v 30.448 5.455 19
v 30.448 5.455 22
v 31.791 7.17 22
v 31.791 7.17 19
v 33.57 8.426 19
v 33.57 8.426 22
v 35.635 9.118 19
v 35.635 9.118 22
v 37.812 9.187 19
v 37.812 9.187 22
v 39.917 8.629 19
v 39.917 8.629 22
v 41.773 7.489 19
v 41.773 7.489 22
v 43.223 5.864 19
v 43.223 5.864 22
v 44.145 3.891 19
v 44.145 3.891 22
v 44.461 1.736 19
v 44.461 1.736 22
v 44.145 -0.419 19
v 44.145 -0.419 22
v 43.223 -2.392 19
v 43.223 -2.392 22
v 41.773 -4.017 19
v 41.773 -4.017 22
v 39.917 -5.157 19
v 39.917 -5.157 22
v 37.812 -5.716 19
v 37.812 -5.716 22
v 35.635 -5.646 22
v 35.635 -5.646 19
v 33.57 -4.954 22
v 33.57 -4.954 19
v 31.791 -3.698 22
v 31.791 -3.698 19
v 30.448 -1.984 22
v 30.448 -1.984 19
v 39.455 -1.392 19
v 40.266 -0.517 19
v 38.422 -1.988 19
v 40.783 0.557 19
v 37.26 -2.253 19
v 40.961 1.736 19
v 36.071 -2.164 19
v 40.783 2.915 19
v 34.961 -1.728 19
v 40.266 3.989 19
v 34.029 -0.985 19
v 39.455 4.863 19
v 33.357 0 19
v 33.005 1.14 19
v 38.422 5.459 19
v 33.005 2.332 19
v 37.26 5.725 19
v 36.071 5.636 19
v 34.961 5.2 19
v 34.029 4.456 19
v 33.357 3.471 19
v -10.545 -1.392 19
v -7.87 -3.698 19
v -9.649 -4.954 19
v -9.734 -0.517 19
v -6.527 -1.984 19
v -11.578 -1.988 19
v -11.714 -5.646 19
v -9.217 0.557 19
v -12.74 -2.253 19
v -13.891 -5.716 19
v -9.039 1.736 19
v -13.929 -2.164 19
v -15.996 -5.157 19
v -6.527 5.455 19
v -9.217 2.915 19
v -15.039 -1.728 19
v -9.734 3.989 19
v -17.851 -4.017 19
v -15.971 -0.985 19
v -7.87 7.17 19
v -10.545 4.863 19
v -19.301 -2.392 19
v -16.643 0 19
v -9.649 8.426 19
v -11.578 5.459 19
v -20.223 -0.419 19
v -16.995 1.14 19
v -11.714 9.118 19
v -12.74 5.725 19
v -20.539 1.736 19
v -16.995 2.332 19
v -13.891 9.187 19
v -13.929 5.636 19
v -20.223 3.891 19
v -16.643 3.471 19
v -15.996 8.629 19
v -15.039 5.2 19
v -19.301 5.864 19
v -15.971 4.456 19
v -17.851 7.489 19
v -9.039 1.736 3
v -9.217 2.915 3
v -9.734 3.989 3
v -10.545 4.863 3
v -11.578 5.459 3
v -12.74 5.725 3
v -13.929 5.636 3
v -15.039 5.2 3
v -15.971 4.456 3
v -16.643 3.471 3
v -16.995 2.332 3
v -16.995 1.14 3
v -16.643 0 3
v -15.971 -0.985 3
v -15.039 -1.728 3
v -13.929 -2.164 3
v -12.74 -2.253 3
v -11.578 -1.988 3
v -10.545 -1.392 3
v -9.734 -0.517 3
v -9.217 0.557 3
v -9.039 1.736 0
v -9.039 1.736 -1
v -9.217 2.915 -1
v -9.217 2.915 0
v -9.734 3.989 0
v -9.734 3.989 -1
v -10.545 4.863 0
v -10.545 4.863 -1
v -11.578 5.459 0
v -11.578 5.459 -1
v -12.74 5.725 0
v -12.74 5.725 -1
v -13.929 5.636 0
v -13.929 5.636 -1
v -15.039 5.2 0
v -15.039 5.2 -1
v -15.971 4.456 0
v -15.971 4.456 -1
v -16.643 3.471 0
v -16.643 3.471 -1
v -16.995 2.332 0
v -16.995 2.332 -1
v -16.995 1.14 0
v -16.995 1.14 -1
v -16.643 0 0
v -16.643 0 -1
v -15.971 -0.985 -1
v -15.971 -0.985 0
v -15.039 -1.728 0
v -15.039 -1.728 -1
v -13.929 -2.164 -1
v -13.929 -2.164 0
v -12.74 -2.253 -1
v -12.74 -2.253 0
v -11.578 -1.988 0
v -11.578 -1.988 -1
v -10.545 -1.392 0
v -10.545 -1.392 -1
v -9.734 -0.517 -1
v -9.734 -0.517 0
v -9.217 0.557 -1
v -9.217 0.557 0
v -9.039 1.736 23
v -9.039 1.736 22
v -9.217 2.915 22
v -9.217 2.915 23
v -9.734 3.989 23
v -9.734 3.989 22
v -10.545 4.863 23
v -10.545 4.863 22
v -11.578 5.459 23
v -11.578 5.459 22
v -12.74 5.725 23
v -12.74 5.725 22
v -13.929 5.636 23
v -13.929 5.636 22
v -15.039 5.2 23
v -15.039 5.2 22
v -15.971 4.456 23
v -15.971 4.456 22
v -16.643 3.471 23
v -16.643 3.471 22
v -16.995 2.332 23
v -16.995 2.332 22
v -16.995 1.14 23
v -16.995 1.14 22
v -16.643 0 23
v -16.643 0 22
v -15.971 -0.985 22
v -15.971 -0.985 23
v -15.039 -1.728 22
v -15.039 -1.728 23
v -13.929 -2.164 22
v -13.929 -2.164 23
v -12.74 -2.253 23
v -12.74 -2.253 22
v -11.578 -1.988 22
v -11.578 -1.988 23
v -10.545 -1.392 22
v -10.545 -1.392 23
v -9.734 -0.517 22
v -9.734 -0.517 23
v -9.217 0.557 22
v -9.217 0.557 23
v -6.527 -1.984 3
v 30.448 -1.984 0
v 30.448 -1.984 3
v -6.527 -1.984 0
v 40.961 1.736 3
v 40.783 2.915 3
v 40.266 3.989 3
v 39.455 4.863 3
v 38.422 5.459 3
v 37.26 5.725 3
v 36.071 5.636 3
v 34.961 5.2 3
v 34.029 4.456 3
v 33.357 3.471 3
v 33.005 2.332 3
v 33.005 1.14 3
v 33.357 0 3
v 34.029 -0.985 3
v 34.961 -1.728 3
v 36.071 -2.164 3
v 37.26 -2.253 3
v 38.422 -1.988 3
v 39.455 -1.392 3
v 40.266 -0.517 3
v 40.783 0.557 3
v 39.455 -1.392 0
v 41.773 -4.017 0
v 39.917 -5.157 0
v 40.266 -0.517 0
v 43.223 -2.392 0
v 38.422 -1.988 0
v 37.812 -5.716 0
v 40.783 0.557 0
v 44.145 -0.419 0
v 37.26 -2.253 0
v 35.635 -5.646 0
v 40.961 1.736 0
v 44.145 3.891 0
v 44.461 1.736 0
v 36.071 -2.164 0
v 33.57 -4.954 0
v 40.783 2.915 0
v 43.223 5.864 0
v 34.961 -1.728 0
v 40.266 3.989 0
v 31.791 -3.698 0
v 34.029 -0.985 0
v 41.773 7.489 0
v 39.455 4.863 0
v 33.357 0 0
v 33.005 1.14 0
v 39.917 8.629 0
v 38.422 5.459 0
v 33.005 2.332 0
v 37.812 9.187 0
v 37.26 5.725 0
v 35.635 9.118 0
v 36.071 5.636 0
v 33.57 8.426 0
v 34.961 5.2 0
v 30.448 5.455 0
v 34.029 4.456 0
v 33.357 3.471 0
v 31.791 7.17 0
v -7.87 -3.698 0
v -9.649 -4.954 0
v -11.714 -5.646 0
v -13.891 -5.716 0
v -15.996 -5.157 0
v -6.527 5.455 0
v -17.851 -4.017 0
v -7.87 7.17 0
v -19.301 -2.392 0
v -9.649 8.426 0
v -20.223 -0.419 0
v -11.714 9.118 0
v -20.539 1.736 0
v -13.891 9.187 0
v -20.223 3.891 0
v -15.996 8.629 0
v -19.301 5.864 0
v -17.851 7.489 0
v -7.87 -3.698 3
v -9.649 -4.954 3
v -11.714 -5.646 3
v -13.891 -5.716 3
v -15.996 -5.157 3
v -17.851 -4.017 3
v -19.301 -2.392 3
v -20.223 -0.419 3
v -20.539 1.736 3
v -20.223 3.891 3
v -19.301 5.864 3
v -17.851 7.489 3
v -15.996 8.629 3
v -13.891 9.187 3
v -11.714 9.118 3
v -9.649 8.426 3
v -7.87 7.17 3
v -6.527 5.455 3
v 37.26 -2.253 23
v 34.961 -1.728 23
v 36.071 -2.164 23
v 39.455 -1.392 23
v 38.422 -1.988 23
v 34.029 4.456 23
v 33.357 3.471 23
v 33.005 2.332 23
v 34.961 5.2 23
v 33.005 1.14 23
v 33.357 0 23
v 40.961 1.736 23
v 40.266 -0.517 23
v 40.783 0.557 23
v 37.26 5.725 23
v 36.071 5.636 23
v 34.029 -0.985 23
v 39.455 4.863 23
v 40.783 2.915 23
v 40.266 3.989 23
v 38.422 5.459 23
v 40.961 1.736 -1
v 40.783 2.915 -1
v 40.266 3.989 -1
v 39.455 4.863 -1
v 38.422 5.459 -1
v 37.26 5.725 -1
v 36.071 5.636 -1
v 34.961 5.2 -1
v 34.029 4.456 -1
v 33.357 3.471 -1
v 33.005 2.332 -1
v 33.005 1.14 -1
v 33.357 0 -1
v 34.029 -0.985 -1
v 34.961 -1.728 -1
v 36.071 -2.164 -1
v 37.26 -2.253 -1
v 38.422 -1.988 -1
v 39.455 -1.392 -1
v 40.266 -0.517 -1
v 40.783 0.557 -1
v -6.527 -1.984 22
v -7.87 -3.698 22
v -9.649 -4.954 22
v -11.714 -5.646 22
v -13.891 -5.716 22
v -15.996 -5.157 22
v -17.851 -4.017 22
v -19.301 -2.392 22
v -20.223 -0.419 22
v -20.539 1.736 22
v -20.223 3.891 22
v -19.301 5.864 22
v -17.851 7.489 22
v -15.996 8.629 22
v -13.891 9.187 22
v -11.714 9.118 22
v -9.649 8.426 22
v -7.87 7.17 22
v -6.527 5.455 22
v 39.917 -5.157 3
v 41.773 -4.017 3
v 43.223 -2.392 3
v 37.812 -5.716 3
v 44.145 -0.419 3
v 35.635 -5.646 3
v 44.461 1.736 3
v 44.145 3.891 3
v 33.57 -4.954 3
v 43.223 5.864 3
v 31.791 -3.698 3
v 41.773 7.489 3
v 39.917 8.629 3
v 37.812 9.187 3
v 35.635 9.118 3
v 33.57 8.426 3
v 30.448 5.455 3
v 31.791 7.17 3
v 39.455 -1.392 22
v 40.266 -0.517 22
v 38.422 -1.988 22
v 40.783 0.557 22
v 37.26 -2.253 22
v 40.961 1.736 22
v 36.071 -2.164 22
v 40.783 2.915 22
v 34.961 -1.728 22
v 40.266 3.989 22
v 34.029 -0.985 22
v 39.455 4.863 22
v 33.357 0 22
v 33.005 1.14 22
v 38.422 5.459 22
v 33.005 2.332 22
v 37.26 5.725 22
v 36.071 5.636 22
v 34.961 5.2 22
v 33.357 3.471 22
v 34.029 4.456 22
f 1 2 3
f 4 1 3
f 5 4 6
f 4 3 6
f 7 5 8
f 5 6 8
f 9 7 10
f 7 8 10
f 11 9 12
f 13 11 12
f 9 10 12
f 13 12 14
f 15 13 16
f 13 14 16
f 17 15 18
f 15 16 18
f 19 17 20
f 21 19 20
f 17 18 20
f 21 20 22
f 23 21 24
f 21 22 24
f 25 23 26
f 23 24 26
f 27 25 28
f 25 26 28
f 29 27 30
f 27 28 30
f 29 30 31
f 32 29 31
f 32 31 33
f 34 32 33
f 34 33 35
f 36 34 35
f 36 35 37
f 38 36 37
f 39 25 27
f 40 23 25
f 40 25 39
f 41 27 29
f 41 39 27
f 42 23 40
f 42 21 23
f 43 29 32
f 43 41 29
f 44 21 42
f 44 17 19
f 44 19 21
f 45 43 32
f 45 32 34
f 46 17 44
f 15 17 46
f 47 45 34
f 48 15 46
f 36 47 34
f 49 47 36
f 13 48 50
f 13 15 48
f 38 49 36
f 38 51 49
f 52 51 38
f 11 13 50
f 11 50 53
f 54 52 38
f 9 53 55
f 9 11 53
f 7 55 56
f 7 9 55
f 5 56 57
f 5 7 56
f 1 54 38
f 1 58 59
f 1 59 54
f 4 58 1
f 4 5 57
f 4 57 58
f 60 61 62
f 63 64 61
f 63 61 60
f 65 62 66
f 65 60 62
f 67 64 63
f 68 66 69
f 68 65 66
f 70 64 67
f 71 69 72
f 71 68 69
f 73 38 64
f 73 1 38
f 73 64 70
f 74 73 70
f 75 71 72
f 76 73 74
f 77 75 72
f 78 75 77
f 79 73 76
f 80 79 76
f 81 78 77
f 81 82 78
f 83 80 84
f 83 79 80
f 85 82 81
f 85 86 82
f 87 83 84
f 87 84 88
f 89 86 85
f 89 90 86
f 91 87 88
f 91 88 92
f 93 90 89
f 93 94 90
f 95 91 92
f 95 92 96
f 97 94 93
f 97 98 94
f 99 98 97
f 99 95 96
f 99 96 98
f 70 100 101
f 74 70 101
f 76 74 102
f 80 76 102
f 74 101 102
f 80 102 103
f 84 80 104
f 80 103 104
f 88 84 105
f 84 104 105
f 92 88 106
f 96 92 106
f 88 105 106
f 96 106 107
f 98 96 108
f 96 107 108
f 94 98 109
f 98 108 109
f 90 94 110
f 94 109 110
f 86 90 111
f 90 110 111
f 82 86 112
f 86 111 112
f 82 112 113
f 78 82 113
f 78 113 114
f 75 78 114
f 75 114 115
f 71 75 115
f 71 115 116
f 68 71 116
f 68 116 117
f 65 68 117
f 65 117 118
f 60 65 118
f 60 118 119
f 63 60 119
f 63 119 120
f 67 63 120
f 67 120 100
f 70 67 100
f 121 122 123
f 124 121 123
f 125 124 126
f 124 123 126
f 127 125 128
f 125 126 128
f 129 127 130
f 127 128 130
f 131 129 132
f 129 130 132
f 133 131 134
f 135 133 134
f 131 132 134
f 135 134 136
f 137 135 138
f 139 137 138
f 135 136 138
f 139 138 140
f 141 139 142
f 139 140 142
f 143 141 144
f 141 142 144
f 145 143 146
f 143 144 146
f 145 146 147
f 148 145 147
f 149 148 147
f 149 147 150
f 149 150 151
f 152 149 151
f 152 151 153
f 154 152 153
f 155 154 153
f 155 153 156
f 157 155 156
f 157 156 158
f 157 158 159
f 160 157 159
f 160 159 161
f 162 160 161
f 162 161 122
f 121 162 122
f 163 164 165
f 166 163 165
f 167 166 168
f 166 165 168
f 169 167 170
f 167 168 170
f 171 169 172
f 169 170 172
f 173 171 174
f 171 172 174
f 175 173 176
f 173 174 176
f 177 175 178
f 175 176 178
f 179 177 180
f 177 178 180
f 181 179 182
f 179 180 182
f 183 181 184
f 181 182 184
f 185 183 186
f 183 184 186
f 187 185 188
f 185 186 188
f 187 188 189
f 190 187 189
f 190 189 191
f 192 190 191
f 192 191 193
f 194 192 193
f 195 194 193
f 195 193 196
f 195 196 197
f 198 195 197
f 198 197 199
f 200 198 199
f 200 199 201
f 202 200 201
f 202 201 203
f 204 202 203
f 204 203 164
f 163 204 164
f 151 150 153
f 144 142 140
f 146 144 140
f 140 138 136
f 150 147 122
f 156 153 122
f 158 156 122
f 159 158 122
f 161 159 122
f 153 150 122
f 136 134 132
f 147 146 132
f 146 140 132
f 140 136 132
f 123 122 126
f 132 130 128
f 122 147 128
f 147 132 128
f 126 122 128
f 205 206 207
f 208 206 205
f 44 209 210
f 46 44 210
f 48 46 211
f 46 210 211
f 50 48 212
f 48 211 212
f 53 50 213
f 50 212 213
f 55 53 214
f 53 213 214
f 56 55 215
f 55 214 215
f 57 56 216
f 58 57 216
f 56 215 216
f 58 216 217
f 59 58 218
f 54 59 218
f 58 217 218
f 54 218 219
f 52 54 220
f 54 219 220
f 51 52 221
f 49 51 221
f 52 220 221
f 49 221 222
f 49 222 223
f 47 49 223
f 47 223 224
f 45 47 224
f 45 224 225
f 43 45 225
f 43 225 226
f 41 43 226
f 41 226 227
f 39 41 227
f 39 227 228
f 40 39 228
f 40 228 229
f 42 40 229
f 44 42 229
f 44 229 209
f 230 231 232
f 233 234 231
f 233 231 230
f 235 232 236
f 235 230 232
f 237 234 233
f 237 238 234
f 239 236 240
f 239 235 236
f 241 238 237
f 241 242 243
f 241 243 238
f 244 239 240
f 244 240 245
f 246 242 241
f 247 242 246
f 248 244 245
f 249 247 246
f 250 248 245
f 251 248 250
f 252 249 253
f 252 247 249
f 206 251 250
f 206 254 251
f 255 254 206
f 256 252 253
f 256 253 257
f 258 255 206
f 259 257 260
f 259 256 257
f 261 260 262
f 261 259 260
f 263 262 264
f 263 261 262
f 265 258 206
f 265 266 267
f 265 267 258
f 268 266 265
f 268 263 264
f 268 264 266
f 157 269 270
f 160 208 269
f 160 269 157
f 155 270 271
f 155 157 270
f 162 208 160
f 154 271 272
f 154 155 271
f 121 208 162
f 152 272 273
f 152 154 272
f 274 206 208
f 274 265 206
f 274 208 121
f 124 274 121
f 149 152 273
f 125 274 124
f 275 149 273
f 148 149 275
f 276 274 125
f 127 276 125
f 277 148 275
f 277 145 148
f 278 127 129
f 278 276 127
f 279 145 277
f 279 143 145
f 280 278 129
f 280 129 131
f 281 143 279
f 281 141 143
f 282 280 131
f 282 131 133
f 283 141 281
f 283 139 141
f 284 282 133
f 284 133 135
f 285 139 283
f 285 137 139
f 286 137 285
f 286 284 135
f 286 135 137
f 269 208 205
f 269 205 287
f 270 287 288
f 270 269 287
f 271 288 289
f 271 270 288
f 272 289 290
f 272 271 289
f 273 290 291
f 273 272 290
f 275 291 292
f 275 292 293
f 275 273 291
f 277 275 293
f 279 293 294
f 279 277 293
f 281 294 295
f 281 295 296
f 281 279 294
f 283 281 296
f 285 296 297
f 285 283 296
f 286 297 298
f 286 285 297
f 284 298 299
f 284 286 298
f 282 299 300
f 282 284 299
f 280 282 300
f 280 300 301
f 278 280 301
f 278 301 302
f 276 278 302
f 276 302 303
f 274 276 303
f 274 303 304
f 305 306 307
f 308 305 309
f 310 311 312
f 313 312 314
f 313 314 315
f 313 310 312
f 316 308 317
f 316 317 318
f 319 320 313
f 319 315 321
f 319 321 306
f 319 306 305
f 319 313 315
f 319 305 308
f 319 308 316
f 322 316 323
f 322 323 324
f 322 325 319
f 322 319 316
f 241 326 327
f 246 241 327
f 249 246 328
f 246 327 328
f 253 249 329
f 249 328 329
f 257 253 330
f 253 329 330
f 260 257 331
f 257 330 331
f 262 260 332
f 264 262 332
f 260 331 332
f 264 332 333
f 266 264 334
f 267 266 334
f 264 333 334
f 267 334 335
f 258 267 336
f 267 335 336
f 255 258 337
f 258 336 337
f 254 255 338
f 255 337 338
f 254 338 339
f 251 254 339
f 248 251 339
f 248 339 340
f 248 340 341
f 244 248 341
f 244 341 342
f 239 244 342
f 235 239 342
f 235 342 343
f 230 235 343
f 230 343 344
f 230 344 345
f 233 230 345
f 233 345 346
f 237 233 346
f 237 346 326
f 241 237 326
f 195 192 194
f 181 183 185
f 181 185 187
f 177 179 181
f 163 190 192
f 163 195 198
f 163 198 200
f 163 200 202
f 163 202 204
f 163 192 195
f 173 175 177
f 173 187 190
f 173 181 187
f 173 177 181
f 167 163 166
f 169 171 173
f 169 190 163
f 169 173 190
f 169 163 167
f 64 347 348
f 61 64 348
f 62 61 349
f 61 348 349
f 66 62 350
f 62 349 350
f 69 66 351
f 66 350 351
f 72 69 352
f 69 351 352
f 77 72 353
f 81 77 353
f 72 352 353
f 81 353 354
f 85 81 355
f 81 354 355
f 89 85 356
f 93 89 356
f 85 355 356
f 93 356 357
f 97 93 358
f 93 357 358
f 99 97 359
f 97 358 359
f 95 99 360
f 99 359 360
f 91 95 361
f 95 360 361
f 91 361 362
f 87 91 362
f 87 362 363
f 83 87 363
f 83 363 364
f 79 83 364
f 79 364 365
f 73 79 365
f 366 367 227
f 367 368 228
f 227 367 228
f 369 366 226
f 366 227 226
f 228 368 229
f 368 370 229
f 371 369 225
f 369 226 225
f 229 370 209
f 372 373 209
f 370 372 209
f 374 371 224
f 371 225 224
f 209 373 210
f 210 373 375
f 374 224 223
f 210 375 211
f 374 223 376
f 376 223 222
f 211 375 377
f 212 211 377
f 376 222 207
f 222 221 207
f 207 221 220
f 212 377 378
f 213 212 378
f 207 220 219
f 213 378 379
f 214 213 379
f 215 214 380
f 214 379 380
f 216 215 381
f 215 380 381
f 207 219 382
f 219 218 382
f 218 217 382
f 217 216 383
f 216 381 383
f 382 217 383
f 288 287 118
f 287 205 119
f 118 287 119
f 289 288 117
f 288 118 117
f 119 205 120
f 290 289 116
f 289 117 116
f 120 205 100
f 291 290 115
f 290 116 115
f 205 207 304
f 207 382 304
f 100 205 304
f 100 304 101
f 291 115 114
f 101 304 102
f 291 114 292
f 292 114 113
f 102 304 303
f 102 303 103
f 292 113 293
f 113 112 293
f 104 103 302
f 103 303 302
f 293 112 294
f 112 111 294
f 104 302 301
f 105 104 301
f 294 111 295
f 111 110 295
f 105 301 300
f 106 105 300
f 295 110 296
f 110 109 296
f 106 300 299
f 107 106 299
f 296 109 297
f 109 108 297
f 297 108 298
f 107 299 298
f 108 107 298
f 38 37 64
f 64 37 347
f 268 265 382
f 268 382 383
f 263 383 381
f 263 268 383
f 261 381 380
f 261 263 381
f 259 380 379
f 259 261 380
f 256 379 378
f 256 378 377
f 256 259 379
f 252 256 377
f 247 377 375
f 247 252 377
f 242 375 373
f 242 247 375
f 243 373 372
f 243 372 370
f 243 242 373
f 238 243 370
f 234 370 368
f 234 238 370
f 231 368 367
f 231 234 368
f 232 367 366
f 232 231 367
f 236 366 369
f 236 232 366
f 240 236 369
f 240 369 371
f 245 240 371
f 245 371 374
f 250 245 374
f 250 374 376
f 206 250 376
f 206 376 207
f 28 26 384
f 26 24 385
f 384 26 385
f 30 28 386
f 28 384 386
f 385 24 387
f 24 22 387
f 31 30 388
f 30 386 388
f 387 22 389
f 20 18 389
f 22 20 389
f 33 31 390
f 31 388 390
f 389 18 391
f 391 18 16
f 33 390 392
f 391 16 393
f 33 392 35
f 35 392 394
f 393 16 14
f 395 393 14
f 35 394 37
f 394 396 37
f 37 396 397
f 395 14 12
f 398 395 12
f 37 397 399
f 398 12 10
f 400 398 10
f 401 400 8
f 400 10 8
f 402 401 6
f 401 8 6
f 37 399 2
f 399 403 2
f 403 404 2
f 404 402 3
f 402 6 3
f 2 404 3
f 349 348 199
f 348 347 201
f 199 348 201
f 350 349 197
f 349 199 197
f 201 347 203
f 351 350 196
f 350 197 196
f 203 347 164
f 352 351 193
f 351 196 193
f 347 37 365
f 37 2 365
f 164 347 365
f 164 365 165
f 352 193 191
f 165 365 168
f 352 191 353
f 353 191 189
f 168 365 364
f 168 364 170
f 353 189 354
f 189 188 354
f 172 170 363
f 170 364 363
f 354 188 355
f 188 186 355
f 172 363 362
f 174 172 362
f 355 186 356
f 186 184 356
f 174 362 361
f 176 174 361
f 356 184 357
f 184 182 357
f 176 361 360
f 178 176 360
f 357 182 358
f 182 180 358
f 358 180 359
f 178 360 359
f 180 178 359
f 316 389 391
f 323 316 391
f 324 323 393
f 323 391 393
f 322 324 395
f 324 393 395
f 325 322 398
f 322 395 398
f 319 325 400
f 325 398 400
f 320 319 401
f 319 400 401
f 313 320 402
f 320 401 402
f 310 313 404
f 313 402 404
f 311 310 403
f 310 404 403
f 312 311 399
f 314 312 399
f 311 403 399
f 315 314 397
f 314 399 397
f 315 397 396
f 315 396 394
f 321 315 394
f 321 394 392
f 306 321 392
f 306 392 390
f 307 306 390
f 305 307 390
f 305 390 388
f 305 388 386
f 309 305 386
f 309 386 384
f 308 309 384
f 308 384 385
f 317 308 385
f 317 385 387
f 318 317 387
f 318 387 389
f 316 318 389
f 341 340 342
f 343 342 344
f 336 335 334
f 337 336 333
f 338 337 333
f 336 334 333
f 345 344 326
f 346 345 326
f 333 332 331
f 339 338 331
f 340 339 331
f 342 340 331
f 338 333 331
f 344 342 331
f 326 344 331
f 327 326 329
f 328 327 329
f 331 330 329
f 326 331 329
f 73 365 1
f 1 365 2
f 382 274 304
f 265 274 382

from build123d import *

# Parameters (mm, degrees)
SKETCH_1_R           = 4
EXTRUDE_1_DEPTH      = 3
EXTRUDE_2_DEPTH      = 20
EXTRUDE_2_DEPTH_BACK = 4
SKETCH_2_R           = 4


with BuildPart() as part:
    # 草图1 → 凸台-拉伸1 (new body)
    with BuildSketch(Plane.XY):
        with BuildLine():
            Line((-6.52657961, 5.455372618), (30.448093928, 5.455372618))
            ThreePointArc((30.448093928, 5.455372618), (44.460757159, 1.735800378), (30.448093928, -1.983771861))
            Line((30.448093928, -1.983771861), (-6.52657961, -1.983771861))
            ThreePointArc((-6.52657961, -1.983771861), (-20.539242841, 1.735800378), (-6.52657961, 5.455372618))
        make_face()
        with Locations((-13.039242841, 1.735800378)):
            Circle(SKETCH_1_R, mode=Mode.SUBTRACT)
        with Locations(Location((36.960757159, 1.735800378, 0), (0, 0, 180))):
            Circle(SKETCH_1_R, mode=Mode.SUBTRACT)
    extrude_1 = extrude(amount=EXTRUDE_1_DEPTH)

    # 草图2 → 凸台-拉伸2 (add, two sides: drawn at the far end of the back side and taken through both)
    with BuildSketch(Plane.XY.offset(3).offset(-EXTRUDE_2_DEPTH_BACK)):
        with Locations((-13.039242841, 1.735800378)):
            Circle(SKETCH_2_R)
        with Locations((36.960757159, 1.735800378)):
            Circle(SKETCH_2_R)
    extrude(amount=EXTRUDE_2_DEPTH + EXTRUDE_2_DEPTH_BACK)

    # 镜向1: 凸台-拉伸1 across plane
    add(extrude_1.mirror(Plane(origin=(0, 0, 11), x_dir=(1, 0, 0), z_dir=(0, 0, -1))))


solid = part.part
